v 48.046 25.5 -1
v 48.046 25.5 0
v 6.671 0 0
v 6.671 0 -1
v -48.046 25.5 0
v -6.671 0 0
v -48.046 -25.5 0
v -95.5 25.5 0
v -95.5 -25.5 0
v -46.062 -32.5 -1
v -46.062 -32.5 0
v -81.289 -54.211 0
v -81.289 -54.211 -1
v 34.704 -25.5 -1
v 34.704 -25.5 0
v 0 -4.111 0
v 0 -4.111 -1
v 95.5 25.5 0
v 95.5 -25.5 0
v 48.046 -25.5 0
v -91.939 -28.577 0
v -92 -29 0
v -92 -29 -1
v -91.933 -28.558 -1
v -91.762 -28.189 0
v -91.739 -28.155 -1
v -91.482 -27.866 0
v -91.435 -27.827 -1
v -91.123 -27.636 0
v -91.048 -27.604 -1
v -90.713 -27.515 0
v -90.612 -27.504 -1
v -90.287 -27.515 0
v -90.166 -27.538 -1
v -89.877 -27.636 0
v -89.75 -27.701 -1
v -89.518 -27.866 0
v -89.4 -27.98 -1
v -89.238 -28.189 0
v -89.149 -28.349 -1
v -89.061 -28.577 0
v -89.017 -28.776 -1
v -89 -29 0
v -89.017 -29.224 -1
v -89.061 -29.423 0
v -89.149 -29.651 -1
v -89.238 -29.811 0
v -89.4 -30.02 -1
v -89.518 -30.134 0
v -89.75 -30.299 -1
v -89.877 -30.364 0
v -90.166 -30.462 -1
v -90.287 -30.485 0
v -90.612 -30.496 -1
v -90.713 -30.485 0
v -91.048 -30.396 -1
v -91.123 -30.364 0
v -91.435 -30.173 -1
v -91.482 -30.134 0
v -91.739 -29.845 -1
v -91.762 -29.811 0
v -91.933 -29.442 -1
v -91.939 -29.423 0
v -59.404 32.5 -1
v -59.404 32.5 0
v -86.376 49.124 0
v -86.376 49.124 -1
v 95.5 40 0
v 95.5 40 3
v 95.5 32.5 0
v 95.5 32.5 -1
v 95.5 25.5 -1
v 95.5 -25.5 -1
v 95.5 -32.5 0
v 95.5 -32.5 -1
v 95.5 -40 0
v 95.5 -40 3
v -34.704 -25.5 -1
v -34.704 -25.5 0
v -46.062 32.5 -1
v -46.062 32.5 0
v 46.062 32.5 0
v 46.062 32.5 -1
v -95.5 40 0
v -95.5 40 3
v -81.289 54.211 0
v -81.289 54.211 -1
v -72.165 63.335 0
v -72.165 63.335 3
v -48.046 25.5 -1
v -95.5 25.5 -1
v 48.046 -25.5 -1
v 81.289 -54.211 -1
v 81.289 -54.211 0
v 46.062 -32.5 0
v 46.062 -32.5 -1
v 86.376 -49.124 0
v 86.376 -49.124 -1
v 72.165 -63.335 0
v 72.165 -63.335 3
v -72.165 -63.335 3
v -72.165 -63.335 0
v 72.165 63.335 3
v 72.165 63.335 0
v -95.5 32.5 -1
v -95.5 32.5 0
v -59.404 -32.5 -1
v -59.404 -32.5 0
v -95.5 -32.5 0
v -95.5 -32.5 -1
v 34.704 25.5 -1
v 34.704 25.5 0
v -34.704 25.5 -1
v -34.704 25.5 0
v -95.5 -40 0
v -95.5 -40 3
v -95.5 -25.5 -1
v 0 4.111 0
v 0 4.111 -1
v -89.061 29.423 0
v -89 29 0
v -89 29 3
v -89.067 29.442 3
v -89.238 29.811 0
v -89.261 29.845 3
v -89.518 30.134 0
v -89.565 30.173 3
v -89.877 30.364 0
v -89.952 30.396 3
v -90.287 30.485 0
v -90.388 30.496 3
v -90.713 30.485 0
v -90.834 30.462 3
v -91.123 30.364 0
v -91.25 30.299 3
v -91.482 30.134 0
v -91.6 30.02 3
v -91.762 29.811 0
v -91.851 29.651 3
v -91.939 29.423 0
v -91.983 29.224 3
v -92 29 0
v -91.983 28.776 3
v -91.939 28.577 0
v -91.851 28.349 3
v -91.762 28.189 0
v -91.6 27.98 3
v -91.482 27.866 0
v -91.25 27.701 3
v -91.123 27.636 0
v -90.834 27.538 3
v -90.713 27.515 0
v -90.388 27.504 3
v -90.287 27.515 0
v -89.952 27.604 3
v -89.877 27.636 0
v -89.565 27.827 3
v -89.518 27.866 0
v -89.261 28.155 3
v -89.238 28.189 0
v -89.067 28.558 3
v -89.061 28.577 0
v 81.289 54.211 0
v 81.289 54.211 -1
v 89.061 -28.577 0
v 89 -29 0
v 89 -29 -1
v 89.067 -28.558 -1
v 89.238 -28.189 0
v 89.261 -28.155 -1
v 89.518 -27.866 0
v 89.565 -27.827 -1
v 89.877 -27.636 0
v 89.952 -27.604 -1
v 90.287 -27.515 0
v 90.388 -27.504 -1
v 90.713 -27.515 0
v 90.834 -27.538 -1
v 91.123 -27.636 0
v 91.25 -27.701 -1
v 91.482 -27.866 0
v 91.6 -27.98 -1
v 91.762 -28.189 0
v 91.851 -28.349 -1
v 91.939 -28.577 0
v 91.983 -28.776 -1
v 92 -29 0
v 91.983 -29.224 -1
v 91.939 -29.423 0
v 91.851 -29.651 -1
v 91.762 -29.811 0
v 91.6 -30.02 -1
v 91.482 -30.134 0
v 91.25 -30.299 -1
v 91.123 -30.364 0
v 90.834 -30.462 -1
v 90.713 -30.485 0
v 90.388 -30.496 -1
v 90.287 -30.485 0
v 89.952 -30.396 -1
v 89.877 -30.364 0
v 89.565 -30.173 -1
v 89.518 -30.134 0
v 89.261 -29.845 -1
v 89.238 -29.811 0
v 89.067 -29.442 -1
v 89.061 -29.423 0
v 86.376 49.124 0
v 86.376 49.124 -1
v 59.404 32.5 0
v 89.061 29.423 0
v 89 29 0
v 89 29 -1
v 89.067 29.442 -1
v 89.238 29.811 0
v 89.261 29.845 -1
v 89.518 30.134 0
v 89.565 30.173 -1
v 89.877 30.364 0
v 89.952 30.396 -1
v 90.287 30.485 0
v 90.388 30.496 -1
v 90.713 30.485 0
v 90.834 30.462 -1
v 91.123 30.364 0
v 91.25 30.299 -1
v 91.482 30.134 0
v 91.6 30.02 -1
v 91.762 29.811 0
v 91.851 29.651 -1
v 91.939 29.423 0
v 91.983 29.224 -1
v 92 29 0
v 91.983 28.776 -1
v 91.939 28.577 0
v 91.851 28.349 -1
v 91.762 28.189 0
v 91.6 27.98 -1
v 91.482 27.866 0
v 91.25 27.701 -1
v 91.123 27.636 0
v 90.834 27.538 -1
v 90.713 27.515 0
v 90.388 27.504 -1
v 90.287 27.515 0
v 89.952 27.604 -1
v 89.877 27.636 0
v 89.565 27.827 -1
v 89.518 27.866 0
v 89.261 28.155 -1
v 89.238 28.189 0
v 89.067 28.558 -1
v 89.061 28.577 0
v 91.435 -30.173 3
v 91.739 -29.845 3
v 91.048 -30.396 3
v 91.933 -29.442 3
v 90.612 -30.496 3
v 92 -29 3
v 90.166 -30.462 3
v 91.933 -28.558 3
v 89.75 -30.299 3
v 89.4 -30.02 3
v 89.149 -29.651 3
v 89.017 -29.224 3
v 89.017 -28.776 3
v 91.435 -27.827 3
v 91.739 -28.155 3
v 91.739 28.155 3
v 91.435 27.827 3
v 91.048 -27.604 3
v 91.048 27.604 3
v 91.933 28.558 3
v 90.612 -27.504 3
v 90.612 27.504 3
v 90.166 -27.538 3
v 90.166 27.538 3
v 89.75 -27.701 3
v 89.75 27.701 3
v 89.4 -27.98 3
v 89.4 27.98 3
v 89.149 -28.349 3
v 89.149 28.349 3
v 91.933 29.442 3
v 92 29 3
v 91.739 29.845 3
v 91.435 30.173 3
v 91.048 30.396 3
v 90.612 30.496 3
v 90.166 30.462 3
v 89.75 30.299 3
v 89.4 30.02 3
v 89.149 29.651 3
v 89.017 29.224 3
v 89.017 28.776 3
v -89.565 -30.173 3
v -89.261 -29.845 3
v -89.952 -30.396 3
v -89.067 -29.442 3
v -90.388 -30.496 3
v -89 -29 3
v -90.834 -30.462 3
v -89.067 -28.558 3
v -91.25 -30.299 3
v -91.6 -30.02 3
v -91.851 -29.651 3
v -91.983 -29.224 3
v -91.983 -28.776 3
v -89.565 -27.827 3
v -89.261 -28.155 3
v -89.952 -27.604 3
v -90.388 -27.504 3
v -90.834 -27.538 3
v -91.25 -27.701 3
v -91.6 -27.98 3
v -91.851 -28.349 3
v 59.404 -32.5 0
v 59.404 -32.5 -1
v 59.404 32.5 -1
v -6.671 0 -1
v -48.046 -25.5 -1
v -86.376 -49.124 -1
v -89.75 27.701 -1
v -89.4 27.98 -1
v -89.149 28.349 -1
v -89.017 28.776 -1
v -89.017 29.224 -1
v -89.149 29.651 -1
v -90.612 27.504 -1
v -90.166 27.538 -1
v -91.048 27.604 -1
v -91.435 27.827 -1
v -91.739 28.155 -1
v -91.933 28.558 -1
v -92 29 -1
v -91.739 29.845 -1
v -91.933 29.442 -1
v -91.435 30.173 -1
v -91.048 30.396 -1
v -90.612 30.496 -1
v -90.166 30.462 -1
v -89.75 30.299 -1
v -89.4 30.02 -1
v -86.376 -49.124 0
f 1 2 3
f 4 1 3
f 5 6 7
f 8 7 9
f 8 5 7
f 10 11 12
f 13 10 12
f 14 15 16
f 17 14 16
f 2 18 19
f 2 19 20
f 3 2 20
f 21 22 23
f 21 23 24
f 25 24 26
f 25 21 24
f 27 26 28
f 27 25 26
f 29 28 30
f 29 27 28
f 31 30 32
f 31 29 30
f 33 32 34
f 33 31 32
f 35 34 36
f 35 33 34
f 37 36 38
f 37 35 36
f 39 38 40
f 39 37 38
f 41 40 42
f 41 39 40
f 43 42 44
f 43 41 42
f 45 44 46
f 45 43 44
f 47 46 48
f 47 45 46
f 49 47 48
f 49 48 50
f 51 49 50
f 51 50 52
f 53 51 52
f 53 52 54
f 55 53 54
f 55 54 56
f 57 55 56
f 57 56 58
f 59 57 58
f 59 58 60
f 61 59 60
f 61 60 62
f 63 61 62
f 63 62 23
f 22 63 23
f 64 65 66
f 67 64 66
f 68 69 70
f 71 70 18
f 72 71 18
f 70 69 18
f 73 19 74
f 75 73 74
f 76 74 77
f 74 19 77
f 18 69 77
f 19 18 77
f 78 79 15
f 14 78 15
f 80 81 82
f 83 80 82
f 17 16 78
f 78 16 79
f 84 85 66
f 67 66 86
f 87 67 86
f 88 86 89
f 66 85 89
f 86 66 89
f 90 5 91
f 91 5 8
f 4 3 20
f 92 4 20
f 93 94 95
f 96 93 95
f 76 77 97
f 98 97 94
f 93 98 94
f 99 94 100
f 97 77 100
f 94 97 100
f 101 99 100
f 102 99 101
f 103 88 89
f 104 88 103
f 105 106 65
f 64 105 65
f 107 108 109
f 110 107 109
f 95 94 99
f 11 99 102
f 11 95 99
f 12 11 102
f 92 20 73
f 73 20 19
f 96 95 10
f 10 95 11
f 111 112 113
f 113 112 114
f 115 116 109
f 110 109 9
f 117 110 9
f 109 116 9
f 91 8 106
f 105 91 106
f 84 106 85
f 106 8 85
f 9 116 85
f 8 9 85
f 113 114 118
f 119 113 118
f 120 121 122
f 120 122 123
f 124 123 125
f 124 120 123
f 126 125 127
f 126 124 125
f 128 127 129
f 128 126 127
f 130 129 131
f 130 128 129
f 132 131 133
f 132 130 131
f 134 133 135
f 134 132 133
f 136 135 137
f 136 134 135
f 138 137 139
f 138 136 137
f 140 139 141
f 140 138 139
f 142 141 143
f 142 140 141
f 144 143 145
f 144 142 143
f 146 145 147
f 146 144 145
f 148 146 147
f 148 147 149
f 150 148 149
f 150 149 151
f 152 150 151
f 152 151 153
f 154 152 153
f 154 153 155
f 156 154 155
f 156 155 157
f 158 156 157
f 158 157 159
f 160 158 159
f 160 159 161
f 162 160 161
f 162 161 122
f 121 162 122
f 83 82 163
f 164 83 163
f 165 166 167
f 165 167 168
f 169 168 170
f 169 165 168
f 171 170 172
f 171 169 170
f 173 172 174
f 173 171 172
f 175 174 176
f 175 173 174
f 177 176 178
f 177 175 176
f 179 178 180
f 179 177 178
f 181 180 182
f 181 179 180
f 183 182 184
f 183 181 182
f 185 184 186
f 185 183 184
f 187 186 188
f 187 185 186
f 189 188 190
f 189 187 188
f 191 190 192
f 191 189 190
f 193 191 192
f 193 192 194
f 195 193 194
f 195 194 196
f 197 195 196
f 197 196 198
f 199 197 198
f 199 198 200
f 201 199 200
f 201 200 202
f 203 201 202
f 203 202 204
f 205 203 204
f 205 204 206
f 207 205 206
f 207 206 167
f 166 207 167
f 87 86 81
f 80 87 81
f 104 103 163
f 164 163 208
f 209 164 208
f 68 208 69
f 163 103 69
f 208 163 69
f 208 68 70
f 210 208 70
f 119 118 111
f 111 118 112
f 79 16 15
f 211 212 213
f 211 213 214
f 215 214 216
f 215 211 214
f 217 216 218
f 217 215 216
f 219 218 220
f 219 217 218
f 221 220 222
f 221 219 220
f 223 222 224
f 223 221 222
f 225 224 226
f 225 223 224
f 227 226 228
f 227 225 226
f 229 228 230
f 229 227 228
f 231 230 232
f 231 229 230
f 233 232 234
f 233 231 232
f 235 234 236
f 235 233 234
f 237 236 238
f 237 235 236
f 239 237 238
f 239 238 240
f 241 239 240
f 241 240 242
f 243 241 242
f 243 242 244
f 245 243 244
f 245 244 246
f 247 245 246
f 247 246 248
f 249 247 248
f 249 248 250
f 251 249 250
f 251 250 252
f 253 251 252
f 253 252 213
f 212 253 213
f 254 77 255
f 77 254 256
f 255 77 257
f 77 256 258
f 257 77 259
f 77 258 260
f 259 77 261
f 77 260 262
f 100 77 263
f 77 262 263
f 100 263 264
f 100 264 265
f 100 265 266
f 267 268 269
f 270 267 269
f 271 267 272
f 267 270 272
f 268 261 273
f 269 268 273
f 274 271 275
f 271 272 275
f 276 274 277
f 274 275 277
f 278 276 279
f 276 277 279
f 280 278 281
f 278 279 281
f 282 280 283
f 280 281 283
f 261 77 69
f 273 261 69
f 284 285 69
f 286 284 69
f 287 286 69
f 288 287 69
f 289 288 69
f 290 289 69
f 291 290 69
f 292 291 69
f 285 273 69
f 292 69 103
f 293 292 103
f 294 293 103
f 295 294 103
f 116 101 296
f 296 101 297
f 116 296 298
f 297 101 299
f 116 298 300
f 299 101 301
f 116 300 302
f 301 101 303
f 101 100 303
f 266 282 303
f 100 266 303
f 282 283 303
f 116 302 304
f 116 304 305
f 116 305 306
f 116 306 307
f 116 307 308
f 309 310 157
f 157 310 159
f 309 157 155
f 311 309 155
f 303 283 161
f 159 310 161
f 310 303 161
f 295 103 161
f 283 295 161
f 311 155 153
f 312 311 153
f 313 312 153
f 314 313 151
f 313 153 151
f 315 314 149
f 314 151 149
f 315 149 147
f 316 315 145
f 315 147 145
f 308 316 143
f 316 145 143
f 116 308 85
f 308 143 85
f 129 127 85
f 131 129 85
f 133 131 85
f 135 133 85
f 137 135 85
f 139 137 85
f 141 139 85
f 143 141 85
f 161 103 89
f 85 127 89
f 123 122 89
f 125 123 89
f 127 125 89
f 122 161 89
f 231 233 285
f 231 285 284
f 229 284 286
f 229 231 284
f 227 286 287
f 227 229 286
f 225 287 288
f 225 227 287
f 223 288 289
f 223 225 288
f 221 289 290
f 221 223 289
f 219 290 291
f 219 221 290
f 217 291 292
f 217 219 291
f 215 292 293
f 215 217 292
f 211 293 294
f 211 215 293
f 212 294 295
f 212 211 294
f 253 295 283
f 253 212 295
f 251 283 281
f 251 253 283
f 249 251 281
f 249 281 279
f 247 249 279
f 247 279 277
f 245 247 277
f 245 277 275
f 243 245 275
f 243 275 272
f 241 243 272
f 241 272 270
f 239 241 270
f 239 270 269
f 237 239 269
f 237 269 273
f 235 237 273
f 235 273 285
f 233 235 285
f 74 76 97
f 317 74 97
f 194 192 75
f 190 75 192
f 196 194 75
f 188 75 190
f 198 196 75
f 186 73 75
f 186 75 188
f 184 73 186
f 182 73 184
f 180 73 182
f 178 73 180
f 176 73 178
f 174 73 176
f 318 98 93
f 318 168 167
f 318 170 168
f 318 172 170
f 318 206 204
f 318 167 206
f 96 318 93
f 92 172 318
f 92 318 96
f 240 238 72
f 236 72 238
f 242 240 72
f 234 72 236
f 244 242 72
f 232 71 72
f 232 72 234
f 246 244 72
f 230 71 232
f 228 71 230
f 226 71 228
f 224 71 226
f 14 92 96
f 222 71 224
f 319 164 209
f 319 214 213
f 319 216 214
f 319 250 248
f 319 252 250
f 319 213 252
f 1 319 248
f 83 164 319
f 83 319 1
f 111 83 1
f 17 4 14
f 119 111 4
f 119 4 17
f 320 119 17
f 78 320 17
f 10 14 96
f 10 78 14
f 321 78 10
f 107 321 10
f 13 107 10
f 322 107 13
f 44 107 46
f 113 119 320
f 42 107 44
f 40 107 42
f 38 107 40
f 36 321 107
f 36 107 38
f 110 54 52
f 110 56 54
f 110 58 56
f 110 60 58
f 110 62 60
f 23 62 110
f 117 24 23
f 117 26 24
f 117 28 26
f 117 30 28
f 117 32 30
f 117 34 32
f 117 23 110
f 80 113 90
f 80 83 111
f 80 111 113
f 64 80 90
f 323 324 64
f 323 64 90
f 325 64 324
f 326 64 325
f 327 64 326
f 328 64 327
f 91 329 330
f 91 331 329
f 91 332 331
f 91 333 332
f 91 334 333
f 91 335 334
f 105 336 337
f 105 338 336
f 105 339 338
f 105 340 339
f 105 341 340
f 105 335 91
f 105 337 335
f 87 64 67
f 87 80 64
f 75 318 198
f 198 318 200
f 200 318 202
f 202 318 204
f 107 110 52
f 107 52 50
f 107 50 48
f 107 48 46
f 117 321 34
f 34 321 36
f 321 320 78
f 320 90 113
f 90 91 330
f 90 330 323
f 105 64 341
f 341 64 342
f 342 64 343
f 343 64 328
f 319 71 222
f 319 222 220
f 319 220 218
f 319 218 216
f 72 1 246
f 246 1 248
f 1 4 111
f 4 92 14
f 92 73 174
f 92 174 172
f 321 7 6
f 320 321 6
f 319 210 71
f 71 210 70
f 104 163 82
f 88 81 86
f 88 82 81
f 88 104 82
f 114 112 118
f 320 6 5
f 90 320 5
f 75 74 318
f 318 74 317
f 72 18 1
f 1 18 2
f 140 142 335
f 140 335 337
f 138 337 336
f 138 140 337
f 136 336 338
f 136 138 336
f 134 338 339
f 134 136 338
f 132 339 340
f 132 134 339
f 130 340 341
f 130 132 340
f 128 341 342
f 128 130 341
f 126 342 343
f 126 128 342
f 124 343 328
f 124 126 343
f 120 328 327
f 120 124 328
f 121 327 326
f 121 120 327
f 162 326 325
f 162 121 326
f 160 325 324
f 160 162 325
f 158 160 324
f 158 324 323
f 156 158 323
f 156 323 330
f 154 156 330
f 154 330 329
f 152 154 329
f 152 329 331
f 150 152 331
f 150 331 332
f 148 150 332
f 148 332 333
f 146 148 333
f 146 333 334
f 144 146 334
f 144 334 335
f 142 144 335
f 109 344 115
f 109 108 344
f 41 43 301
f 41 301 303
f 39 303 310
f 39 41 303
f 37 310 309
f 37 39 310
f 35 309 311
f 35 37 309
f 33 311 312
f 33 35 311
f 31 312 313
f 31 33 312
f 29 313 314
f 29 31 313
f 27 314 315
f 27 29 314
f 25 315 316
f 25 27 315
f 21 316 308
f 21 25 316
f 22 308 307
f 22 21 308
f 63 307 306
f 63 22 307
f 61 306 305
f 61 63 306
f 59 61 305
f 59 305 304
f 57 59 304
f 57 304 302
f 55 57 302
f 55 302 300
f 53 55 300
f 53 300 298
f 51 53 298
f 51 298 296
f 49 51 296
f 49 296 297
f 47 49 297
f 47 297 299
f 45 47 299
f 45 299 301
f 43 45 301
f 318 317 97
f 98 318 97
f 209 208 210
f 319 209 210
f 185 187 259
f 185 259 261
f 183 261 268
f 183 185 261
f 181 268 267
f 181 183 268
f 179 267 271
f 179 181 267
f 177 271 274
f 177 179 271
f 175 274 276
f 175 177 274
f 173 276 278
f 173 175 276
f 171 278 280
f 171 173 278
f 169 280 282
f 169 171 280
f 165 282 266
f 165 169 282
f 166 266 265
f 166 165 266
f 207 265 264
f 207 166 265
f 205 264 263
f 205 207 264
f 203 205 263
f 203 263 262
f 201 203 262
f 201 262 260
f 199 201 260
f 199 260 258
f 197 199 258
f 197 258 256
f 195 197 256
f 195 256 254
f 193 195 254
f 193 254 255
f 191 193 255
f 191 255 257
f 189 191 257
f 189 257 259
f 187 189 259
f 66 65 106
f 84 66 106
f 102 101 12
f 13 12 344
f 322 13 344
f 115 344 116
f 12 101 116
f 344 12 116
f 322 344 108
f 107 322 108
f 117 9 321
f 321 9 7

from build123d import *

# Parameters (mm, degrees)
SKETCH1_R           = 1.5
BOSS_EXTRUDE1_DEPTH = 3
SKETCH2_R           = 1.5
BOSS_EXTRUDE2_DEPTH = 1


with BuildPart() as part:
    # Sketch1 → Boss-Extrude1 (new body)
    with BuildSketch(Plane.XY):
        Polygon((-95.5, -40), (-95.5, 40), (-72.165476221, 63.334523779), (72.165476221, 63.334523779), (95.5, 40), (95.5, -40), (72.165476221, -63.334523779), (-72.165476221, -63.334523779), align=None)
        with Locations((-90.5, 29)):
            Circle(SKETCH1_R, mode=Mode.SUBTRACT)
        with Locations((-90.5, -29)):
            Circle(SKETCH1_R, mode=Mode.SUBTRACT)
        with Locations((90.5, -29)):
            Circle(SKETCH1_R, mode=Mode.SUBTRACT)
        with Locations((90.5, 29)):
            Circle(SKETCH1_R, mode=Mode.SUBTRACT)
    extrude(amount=BOSS_EXTRUDE1_DEPTH)

    # Sketch2 → Boss-Extrude2 (add)
    with BuildSketch(Plane(origin=(0, 0, 0), x_dir=(-1, 0, 0), z_dir=(0, 0, -1))):
        Polygon((-59.403736545, 32.5), (-46.062041549, 32.5), (-81.28908922, 54.21091078), (-86.376387001, 49.123612999), align=None)
        Polygon((-34.704188524, 25.5), (-46.062041549, 32.5), (-59.403736545, 32.5), (-48.045883519, 25.5), align=None)
        Polygon((-48.045883519, 25.5), (-59.403736545, 32.5), (-95.5, 32.5), (-95.5, 25.5), align=None)
        with Locations((-90.5, 29)):
            Circle(SKETCH2_R, mode=Mode.SUBTRACT)
        Polygon((34.704188524, 25.5), (46.062041549, 32.5), (-46.062041549, 32.5), (-34.704188524, 25.5), align=None)
        Polygon((59.403736545, 32.5), (46.062041549, 32.5), (34.704188524, 25.5), (48.045883519, 25.5), align=None)
        Polygon((86.376387001, 49.123612999), (81.28908922, 54.21091078), (46.062041549, 32.5), (59.403736545, 32.5), align=None)
        Polygon((95.5, 32.5), (59.403736545, 32.5), (48.045883519, 25.5), (95.5, 25.5), align=None)
        with Locations((90.5, 29)):
            Circle(SKETCH2_R, mode=Mode.SUBTRACT)
        Polygon((-6.670847498, 0), (0, 4.111334455), (-34.704188524, 25.5), (-48.045883519, 25.5), align=None)
        Polygon((48.045883519, 25.5), (34.704188524, 25.5), (0, 4.111334455), (6.670847498, 0), align=None)
        Polygon((6.670847498, 0), (0, 4.111334455), (-6.670847498, 0), (0, -4.111334455), align=None)
        Polygon((48.045883519, -25.5), (6.670847498, 0), (0, -4.111334455), (34.704188524, -25.5), align=None)
        Polygon((0, -4.111334455), (-6.670847498, 0), (-48.045883519, -25.5), (-34.704188524, -25.5), align=None)
        Polygon((-34.704188524, -25.5), (-48.045883519, -25.5), (-59.403736545, -32.5), (-46.062041549, -32.5), align=None)
        Polygon((-59.403736545, -32.5), (-48.045883519, -25.5), (-95.5, -25.5), (-95.5, -32.5), align=None)
        with Locations((-90.5, -29)):
            Circle(SKETCH2_R, mode=Mode.SUBTRACT)
        Polygon((34.704188524, -25.5), (-34.704188524, -25.5), (-46.062041549, -32.5), (46.062041549, -32.5), align=None)
        Polygon((59.403736545, -32.5), (48.045883519, -25.5), (34.704188524, -25.5), (46.062041549, -32.5), align=None)
        Polygon((95.5, -25.5), (48.045883519, -25.5), (59.403736545, -32.5), (95.5, -32.5), align=None)
        with Locations((90.5, -29)):
            Circle(SKETCH2_R, mode=Mode.SUBTRACT)
        Polygon((86.376387001, -49.123612999), (59.403736545, -32.5), (46.062041549, -32.5), (81.28908922, -54.21091078), align=None)
        Polygon((-46.062041549, -32.5), (-59.403736545, -32.5), (-86.376387001, -49.123612999), (-81.28908922, -54.21091078), align=None)
    extrude(amount=BOSS_EXTRUDE2_DEPTH)


solid = part.part
